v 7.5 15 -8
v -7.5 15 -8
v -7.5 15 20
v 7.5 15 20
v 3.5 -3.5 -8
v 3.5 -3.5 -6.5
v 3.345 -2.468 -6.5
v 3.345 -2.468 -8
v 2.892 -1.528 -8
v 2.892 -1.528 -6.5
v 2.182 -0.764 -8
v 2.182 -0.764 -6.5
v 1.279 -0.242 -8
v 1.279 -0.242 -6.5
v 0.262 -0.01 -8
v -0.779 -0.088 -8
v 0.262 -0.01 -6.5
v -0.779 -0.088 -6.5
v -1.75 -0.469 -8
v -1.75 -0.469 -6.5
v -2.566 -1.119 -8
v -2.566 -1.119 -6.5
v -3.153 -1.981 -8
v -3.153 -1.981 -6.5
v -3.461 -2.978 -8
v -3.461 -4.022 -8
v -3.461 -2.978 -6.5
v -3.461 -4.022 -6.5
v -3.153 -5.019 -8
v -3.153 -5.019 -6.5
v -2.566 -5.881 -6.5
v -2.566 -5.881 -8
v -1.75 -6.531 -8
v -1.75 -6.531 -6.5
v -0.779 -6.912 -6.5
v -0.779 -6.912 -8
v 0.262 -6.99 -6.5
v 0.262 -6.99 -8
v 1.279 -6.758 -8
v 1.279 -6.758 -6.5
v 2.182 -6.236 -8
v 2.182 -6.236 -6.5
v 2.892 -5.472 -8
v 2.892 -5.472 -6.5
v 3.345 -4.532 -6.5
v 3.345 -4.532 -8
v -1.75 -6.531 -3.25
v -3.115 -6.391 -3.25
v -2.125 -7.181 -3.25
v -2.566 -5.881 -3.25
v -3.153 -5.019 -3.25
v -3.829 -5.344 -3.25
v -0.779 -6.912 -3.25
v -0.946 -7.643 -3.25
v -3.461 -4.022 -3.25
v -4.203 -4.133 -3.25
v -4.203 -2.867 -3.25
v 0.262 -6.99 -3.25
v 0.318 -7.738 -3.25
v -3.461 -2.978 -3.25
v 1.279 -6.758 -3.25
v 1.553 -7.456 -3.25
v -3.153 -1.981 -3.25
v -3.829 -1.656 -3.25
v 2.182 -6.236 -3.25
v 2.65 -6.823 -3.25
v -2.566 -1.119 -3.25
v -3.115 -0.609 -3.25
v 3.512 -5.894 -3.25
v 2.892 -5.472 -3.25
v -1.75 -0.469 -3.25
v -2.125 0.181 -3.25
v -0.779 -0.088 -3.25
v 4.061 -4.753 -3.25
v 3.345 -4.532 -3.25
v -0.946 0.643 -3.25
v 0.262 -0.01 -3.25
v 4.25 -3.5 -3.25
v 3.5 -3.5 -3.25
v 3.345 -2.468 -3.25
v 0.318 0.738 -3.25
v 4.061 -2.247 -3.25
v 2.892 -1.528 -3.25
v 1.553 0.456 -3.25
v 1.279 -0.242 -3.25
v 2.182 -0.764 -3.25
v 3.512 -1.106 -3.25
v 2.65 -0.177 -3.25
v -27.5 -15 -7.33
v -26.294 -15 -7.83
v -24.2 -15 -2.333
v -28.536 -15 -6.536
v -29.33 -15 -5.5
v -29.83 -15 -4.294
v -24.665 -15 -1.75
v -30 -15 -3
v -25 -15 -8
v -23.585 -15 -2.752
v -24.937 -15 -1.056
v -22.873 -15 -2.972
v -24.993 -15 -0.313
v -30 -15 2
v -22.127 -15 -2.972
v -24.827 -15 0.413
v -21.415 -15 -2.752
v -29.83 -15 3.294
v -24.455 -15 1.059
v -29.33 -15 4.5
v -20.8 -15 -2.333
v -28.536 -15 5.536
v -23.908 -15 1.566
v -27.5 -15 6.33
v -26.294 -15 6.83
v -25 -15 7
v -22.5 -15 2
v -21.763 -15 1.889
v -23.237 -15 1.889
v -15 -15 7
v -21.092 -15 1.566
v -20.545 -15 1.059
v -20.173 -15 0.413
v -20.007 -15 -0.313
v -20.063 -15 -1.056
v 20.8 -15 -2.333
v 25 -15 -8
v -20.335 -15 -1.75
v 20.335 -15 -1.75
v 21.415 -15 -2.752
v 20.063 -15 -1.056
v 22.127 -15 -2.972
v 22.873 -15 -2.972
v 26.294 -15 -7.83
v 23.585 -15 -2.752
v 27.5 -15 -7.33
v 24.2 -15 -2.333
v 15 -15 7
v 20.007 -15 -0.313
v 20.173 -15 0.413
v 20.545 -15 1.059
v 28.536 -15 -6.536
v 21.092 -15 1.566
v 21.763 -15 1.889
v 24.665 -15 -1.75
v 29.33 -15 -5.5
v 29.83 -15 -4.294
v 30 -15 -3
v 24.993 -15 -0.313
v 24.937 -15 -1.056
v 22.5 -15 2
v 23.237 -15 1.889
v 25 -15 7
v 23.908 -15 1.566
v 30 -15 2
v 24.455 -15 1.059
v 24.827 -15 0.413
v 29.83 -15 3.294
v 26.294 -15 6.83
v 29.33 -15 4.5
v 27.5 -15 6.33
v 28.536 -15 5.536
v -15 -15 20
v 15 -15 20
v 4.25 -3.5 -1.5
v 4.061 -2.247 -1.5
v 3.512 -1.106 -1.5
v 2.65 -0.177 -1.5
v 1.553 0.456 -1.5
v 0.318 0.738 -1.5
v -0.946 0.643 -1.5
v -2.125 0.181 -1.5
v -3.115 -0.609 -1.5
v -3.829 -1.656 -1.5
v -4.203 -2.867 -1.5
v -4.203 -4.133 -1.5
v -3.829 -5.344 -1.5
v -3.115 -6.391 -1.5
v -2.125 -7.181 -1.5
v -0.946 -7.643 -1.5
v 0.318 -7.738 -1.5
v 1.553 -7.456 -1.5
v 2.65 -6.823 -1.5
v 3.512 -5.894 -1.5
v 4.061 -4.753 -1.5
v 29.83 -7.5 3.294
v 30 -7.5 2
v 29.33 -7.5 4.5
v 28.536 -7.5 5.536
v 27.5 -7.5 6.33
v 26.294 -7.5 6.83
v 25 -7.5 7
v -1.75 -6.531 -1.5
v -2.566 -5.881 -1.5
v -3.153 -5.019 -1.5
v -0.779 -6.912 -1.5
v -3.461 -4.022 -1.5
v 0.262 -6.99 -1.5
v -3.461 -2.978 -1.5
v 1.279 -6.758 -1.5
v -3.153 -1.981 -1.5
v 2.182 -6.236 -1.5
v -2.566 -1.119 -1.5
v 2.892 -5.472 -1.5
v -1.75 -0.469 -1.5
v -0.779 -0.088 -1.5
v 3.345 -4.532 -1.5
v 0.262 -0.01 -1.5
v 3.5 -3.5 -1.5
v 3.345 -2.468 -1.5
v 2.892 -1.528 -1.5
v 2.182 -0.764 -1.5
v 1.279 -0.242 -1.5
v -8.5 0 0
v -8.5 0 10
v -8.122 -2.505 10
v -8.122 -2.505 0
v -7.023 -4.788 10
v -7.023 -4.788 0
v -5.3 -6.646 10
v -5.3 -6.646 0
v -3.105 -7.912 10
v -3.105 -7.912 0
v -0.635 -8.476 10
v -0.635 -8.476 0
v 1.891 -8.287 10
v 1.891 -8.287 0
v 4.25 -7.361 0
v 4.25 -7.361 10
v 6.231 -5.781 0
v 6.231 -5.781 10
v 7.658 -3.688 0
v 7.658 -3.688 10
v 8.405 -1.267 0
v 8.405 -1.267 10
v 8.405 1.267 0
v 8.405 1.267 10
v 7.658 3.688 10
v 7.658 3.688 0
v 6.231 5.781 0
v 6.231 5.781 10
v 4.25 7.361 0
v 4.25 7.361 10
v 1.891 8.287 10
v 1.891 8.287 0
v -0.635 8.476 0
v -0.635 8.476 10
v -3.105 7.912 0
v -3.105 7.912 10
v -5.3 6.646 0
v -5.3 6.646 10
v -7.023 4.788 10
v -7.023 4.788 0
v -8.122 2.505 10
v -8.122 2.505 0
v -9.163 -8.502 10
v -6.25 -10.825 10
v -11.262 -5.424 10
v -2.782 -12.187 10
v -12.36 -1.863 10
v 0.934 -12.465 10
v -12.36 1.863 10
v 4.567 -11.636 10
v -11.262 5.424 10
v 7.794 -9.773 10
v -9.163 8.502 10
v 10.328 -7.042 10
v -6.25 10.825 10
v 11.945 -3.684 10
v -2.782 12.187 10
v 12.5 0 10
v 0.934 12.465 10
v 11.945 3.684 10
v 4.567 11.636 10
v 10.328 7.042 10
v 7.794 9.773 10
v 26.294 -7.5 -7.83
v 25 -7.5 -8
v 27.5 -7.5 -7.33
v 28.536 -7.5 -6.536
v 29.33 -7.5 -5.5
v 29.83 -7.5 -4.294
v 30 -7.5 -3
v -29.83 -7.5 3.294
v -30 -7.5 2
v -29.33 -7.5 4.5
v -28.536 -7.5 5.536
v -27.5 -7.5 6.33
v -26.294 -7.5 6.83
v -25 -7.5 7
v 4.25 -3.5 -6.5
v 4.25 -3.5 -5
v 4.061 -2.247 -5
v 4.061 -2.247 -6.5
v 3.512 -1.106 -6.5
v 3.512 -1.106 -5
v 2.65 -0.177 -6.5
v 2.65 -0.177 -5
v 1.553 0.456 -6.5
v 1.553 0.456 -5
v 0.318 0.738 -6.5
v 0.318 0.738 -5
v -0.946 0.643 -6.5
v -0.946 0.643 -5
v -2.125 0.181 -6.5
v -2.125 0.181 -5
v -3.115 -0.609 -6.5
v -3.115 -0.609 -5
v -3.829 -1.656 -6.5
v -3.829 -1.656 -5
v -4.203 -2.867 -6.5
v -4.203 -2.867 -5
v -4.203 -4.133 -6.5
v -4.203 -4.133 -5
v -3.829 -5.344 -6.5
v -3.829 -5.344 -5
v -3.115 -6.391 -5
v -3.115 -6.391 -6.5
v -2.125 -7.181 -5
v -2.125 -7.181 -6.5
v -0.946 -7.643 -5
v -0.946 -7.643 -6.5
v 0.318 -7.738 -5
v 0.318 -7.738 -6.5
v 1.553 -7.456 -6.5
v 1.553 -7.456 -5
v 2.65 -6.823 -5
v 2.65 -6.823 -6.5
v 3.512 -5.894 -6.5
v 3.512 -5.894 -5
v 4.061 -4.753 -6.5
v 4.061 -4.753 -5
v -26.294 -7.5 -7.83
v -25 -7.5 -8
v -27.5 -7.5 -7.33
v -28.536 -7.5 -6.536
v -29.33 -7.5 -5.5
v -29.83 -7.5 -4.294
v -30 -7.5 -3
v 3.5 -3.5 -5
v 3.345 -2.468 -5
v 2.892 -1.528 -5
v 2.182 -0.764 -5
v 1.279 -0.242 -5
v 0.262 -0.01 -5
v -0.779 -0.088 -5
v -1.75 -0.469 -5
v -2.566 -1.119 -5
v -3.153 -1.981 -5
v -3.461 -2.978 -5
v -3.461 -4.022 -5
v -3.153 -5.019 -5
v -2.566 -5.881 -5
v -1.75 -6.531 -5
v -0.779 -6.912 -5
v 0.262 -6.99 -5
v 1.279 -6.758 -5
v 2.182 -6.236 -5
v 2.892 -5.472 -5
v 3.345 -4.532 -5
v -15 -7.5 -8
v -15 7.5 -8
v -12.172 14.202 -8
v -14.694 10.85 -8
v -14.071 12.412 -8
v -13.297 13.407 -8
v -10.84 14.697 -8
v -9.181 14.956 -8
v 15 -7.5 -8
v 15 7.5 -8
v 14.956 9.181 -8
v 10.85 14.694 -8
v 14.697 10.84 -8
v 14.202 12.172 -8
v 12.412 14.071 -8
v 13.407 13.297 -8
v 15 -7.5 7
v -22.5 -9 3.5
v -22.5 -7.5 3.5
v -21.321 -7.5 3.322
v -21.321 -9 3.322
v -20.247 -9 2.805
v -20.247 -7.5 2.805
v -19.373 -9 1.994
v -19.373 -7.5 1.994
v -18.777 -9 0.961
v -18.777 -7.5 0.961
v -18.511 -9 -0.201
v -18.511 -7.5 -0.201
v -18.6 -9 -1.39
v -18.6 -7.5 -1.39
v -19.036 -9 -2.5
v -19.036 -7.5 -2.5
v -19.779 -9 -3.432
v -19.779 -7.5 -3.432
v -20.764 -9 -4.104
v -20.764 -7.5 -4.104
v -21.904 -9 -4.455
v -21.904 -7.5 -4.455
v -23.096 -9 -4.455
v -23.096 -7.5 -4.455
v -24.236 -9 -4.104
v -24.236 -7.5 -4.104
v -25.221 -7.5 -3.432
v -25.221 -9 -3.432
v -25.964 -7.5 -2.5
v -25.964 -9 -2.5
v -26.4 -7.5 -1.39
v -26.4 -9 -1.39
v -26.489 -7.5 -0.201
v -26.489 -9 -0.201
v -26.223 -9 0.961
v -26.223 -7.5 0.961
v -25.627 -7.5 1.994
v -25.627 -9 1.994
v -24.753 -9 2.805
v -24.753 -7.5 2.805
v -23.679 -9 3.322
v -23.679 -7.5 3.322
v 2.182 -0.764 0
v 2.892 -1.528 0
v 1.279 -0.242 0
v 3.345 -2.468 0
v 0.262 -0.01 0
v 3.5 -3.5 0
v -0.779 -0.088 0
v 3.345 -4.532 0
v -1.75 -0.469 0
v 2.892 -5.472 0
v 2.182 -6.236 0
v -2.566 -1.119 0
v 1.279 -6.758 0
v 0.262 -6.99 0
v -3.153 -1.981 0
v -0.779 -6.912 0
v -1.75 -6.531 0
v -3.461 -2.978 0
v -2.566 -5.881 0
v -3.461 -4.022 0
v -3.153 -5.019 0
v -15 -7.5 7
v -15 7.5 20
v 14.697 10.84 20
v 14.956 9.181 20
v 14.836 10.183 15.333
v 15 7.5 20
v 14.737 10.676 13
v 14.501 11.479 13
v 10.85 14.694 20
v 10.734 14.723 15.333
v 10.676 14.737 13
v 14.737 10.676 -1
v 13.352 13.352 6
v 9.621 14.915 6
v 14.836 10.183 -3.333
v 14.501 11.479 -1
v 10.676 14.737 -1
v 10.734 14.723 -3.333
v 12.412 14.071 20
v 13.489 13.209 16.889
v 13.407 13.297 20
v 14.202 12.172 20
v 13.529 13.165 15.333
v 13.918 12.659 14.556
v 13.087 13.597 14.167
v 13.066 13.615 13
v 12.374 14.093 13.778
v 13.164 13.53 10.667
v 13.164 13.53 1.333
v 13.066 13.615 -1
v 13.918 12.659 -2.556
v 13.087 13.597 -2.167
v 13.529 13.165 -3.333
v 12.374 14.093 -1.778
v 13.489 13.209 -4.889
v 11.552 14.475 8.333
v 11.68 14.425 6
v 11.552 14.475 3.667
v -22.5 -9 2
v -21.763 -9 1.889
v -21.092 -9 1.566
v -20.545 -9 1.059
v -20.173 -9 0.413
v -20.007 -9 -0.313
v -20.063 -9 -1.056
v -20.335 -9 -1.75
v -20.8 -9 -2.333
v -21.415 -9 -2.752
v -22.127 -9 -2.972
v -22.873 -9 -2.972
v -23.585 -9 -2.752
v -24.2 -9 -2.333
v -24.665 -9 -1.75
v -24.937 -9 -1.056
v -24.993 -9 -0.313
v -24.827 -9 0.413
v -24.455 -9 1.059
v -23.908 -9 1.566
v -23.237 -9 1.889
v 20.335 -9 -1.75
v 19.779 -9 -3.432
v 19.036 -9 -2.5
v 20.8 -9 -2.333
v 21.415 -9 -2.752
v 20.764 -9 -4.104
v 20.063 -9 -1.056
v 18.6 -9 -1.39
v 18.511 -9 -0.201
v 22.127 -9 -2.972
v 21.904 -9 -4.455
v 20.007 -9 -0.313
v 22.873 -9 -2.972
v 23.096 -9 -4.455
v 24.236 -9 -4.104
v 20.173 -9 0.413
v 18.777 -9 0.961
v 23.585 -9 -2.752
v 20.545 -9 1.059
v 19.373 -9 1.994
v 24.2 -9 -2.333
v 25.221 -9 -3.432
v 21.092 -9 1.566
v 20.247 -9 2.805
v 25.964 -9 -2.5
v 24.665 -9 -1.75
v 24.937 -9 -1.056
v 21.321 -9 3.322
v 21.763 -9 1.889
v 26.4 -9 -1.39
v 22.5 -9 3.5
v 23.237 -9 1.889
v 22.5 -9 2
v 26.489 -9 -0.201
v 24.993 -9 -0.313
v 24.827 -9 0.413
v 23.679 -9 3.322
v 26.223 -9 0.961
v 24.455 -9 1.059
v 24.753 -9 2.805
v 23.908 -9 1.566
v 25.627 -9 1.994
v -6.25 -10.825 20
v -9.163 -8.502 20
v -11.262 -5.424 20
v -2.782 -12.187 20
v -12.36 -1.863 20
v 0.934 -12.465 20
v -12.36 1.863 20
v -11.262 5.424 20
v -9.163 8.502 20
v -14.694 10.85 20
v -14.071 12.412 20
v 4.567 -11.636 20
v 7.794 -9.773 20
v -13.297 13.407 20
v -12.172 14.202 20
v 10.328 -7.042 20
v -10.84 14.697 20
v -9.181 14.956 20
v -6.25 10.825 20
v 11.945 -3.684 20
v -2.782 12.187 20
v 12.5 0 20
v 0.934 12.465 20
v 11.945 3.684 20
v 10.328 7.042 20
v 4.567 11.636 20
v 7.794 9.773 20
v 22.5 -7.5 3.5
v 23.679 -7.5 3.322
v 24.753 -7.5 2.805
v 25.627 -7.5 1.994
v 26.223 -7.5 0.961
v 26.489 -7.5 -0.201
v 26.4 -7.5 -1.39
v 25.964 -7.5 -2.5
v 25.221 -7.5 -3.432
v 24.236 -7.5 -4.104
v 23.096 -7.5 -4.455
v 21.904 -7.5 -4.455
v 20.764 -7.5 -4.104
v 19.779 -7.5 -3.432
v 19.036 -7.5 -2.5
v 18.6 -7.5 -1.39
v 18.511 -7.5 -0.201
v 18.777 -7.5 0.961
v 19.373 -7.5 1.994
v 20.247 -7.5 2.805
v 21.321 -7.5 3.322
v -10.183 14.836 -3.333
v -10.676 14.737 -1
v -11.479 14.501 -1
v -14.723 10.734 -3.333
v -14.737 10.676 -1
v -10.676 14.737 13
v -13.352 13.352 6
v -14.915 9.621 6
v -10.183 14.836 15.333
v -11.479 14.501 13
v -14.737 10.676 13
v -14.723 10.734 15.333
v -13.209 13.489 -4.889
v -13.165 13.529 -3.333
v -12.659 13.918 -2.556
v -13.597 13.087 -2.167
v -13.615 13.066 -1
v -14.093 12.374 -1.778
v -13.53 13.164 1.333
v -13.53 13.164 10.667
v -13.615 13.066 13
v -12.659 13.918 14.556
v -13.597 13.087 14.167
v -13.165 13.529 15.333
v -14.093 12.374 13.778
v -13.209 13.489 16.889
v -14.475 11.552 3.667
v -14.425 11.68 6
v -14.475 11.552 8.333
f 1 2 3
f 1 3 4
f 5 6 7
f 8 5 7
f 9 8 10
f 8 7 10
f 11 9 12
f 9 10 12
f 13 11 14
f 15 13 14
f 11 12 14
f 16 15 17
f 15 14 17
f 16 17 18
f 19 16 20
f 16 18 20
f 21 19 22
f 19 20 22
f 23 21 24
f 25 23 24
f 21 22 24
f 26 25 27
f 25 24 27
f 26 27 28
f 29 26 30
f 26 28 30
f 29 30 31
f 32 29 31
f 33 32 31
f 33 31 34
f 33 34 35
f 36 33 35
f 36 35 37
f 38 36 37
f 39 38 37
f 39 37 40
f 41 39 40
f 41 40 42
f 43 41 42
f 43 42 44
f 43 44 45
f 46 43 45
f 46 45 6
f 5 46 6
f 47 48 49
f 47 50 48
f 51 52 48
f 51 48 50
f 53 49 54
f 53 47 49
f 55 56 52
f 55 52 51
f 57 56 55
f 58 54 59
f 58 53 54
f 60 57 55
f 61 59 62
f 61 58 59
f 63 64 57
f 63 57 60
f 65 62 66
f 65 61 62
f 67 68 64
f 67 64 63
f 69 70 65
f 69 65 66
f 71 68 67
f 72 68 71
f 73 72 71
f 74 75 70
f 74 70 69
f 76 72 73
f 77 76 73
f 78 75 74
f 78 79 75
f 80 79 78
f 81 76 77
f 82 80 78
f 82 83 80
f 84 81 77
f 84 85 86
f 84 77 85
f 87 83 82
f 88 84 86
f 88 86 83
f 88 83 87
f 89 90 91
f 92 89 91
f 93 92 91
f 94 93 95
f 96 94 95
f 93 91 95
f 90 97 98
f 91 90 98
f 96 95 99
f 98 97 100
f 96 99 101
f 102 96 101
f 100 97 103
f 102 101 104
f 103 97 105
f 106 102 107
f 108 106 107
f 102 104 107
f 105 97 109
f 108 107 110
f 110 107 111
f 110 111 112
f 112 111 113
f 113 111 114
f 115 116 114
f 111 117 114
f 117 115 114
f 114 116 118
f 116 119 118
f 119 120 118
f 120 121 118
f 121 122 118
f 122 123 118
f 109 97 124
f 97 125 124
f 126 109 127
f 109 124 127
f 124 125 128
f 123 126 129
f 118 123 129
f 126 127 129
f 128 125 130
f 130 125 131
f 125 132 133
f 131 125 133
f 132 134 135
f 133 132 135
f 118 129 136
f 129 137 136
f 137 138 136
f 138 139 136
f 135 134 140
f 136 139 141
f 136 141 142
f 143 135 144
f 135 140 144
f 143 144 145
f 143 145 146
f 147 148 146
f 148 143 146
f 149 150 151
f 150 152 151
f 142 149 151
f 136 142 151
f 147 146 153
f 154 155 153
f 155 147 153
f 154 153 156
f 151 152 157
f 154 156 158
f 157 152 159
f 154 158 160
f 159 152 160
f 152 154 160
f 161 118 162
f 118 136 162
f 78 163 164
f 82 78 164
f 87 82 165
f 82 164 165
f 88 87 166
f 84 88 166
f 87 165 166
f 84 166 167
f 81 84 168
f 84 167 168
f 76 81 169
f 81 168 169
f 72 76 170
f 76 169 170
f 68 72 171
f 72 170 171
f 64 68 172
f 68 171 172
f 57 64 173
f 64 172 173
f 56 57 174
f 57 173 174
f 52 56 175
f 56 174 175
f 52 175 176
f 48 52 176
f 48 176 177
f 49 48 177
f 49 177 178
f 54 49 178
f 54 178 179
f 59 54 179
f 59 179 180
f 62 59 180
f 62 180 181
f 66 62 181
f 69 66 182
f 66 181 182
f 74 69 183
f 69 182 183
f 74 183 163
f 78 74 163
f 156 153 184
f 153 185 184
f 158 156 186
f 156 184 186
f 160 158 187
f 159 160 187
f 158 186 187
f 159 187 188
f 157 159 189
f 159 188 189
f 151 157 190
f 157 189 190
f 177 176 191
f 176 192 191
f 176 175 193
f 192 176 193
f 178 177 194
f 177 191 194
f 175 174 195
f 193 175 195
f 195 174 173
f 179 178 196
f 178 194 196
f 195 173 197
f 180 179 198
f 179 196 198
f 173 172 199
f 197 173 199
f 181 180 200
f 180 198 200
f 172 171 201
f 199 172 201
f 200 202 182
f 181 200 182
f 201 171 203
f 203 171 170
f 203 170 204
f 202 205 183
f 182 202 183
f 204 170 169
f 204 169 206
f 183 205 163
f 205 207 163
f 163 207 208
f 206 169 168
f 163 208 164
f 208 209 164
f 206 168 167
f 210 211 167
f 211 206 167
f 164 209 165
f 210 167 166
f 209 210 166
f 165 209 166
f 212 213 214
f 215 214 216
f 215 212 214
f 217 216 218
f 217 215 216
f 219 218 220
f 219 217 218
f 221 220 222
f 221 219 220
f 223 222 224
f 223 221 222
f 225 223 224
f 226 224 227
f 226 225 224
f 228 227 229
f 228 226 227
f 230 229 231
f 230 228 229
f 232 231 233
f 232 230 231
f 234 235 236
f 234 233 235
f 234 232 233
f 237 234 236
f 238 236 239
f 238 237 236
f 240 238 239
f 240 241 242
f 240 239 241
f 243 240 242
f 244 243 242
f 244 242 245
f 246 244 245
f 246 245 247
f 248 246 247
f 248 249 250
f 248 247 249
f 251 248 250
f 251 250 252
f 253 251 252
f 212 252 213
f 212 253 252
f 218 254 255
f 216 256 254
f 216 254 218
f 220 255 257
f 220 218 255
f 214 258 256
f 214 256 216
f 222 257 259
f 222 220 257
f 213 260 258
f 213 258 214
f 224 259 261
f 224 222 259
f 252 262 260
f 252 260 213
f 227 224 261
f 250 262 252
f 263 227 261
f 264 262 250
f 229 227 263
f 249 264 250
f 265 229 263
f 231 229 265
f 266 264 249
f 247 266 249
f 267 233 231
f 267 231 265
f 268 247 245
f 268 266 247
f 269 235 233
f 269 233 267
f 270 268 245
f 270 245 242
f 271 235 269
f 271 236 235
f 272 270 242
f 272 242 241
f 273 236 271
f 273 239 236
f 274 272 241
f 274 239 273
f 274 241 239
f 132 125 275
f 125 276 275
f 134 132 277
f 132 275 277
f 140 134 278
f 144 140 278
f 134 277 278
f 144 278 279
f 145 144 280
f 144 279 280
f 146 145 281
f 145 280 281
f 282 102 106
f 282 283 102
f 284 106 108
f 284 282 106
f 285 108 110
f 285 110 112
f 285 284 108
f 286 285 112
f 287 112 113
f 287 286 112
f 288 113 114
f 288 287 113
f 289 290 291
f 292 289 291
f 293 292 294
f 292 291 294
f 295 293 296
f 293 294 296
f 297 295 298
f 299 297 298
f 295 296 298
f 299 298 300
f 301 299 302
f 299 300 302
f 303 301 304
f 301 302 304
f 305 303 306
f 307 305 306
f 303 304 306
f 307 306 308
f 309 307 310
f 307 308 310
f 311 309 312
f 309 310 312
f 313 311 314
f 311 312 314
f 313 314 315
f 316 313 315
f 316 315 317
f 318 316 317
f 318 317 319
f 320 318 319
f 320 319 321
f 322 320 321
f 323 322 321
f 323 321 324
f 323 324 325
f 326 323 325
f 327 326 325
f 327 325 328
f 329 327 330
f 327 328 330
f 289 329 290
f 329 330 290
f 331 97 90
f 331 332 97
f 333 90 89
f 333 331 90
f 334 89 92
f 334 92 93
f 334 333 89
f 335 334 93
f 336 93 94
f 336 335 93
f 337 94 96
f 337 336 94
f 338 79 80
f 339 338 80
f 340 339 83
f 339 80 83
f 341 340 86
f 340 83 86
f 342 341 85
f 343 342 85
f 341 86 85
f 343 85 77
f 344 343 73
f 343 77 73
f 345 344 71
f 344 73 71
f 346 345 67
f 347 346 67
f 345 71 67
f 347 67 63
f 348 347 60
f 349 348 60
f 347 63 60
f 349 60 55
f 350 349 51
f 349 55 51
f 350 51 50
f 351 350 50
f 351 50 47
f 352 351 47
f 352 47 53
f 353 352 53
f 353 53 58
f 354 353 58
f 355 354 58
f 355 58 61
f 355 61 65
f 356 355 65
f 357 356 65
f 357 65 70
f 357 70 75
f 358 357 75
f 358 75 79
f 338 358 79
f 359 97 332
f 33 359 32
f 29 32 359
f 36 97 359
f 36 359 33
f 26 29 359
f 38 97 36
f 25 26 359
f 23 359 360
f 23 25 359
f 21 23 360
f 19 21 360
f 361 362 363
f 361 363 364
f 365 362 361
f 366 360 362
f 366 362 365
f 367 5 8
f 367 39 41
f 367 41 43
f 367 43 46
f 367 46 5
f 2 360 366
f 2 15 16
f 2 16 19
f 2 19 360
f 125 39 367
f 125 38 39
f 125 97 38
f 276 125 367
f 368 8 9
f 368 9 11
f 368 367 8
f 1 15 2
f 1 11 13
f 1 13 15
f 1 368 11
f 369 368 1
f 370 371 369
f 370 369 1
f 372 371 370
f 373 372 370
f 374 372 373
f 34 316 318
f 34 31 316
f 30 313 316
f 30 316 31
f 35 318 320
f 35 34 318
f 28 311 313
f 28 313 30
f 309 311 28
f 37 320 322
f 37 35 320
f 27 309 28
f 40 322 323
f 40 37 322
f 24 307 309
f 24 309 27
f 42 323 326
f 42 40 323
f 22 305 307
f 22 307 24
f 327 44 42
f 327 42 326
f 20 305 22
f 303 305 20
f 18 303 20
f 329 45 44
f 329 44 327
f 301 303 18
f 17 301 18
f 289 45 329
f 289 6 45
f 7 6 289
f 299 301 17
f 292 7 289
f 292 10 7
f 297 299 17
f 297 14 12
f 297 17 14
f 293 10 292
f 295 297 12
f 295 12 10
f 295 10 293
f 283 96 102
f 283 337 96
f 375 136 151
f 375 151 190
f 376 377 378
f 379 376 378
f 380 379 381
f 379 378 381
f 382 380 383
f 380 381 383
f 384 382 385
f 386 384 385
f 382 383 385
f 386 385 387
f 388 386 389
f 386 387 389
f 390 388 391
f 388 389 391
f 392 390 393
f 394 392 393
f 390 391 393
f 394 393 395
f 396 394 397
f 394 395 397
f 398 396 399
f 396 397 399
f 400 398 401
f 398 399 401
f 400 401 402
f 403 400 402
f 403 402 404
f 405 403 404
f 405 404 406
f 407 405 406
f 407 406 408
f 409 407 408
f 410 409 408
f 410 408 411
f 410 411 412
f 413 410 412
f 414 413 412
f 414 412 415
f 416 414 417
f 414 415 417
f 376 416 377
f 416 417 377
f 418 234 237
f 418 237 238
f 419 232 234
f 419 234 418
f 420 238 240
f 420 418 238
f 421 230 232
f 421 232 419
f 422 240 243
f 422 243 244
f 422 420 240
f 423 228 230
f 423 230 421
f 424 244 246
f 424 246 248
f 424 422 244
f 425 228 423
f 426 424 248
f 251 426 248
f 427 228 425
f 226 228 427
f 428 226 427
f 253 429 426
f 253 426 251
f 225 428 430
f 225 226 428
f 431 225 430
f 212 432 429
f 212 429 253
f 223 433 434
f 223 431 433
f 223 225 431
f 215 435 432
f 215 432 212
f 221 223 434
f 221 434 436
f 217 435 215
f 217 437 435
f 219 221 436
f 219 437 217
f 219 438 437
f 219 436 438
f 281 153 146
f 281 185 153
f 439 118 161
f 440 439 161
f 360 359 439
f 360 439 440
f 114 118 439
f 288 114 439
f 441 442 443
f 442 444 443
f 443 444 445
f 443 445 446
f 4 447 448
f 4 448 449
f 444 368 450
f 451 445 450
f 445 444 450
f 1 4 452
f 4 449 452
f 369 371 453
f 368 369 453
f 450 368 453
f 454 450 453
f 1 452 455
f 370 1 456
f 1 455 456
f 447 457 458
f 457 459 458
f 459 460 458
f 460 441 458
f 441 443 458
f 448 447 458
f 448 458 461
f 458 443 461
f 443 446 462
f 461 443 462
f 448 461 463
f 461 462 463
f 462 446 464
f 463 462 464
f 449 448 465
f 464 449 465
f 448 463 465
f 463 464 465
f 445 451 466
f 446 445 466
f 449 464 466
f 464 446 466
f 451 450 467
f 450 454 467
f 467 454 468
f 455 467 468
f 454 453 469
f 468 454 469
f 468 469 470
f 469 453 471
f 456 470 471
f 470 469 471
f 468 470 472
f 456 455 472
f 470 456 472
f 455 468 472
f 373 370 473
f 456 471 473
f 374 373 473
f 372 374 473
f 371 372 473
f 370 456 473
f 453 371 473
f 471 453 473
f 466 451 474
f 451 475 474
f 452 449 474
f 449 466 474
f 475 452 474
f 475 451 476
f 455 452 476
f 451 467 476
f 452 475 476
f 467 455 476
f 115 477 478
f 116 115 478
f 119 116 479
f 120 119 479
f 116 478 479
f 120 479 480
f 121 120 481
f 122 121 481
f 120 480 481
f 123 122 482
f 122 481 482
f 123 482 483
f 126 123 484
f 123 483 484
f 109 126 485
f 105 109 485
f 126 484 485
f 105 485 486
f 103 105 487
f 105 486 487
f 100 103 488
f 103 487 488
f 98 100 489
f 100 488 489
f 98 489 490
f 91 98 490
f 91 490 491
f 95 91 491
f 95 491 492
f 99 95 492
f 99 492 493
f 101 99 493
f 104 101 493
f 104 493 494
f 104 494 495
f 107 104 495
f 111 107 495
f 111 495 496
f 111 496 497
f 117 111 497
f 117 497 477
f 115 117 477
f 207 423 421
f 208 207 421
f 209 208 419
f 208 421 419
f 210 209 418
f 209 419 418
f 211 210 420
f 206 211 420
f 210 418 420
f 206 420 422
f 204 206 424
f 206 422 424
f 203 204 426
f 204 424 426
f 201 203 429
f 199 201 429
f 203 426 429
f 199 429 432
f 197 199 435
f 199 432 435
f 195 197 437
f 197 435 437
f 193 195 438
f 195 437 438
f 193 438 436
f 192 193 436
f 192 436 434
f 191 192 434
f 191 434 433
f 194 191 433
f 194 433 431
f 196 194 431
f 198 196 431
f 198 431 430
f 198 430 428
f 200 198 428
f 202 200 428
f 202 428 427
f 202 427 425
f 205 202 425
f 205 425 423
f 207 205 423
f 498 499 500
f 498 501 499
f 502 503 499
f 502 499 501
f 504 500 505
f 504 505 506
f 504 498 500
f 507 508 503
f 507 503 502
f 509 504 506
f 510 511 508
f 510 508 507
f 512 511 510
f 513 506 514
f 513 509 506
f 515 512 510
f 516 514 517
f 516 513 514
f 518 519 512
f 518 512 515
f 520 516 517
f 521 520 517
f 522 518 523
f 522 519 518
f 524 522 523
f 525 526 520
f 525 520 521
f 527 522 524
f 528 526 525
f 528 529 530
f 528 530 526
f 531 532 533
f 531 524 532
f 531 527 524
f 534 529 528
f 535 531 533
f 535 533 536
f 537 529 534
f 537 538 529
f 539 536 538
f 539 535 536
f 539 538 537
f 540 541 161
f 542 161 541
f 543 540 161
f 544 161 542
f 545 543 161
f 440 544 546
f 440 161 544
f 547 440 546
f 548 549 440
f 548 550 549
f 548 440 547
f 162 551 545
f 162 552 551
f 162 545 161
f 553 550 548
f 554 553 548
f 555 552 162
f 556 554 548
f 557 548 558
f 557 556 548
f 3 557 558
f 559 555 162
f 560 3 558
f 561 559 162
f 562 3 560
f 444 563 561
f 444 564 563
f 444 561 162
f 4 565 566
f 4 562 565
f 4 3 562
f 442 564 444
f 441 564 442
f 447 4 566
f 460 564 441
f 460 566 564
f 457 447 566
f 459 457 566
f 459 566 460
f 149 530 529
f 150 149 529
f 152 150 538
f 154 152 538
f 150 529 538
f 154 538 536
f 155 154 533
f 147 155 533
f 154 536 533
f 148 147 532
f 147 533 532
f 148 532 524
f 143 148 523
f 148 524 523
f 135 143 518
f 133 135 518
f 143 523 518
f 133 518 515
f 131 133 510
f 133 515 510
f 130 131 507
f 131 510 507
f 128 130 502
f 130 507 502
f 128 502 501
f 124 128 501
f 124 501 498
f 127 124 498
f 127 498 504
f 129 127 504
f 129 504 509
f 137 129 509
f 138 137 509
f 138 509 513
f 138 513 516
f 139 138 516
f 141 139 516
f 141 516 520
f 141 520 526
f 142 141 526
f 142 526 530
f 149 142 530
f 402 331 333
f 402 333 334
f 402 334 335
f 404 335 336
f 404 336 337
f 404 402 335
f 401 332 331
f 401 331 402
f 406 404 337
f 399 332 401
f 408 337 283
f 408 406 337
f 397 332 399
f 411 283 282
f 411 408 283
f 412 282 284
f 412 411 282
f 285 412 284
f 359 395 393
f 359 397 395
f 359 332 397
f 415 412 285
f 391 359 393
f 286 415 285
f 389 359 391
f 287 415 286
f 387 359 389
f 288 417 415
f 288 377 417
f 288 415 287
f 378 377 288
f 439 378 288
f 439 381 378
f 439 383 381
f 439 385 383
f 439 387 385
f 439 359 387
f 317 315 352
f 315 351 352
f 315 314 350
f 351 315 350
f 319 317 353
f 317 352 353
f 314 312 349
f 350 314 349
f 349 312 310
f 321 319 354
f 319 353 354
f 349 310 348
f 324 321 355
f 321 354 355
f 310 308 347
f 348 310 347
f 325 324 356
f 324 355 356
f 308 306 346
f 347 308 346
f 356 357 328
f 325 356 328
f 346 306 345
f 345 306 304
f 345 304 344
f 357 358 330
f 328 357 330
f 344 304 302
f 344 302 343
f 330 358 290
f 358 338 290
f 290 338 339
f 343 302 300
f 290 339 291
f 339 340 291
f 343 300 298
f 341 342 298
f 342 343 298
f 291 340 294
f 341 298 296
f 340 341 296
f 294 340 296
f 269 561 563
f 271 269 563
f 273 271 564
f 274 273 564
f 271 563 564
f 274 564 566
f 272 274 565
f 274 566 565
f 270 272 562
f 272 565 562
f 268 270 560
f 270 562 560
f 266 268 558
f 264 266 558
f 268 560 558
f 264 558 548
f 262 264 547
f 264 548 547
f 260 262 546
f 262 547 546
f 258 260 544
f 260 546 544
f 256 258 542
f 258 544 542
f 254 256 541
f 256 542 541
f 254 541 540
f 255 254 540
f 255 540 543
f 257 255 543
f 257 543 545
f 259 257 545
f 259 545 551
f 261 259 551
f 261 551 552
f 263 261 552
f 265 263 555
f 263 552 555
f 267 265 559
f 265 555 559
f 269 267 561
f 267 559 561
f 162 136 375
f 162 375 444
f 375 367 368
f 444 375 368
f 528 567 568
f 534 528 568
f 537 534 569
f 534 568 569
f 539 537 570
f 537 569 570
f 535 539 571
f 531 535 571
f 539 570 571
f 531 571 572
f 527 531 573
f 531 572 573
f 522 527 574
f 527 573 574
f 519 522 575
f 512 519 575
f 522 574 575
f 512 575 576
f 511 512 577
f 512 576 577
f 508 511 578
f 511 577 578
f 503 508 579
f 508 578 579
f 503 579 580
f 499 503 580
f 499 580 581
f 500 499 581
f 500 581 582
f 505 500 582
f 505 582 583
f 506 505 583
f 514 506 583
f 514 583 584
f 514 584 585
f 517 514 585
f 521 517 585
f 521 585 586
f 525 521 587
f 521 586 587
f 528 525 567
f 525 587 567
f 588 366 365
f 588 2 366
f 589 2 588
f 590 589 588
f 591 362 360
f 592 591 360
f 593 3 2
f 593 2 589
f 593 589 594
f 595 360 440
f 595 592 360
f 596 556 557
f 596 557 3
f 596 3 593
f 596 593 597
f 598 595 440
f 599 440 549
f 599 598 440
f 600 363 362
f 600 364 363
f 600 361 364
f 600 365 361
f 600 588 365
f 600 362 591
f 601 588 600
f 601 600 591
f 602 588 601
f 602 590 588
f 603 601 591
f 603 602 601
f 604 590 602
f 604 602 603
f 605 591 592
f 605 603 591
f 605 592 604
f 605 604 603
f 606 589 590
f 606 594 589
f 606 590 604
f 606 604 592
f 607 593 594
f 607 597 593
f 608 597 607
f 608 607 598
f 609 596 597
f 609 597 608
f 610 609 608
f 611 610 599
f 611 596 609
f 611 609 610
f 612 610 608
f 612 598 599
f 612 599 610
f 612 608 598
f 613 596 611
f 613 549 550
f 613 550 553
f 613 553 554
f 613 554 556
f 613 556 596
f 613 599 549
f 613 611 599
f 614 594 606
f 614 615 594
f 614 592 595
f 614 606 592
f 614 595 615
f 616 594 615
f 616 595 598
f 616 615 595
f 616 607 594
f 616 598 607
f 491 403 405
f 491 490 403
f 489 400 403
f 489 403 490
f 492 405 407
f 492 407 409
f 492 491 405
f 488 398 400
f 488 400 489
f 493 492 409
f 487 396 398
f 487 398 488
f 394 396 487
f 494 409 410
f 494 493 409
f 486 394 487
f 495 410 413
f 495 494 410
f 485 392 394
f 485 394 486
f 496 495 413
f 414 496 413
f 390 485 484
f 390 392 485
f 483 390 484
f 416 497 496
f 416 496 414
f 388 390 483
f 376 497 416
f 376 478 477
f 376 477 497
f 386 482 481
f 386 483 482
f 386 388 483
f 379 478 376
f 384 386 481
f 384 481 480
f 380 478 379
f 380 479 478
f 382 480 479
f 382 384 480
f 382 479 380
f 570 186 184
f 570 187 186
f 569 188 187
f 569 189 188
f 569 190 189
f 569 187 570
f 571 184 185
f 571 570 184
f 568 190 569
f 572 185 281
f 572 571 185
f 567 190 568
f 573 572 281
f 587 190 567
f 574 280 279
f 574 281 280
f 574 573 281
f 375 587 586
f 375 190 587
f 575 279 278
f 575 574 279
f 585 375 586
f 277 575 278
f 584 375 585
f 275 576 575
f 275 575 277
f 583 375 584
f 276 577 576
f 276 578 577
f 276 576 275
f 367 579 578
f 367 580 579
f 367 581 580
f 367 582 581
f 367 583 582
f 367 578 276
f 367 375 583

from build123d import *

# Parameters (mm, degrees)
BOSS_EXTRUDE1_DEPTH      = 20
BOSS_EXTRUDE1_DEPTH_BACK = 8
SKETCH1_W                = 30
SKETCH1_H                = 30
FILLET1_SIZE             = 7.5
SKETCH2_R                = 8.5
CUT_EXTRUDE1_DEPTH       = 60
SKETCH3_W                = 15
SKETCH3_H                = 7.5
BOSS_EXTRUDE2_DEPTH      = 15
SKETCH5_W                = 15
SKETCH5_H                = 7.5
BOSS_EXTRUDE4_DEPTH      = 15
SKETCH11_R               = 12.5
CUT_EXTRUDE3_DEPTH       = 10
SKETCH12_R               = 3.5
CUT_EXTRUDE4_DEPTH       = 10
FILLET8_R                = 5
SKETCH15_R               = 4
CUT_EXTRUDE5_DEPTH       = 1.5
SKETCH16_R               = 2.5
CUT_EXTRUDE6_DEPTH       = 12
CUT_EXTRUDE8_START       = -1.5
SKETCH18_R               = 4.25
CUT_EXTRUDE8_DEPTH       = 1.75
CUT_EXTRUDE9_START       = -5
SKETCH18_2_R             = 4.25
CUT_EXTRUDE9_DEPTH       = 1.5


with BuildPart() as part:
    # Sketch1 → Boss-Extrude1 (new, two sides: drawn at the far end of the back side and taken through both)
    with BuildSketch(Plane.XY.offset(-BOSS_EXTRUDE1_DEPTH_BACK)):
        Rectangle(SKETCH1_W, SKETCH1_H)
    extrude(amount=BOSS_EXTRUDE1_DEPTH + BOSS_EXTRUDE1_DEPTH_BACK)

    # Fillet1
    # a fillet whose section is not a circle: 7.5 mm, written as the material it takes off along each edge
    with BuildSketch(Plane(origin=(-15, 15, 38.75), x_dir=(1, 0, 0), z_dir=(0, 0, -1))) as fillet1_piece_1:
        with BuildLine():
            add(Edge.make_bspline([(FILLET1_SIZE, 0), (FILLET1_SIZE * 0.831801948466, 0), (FILLET1_SIZE * 0.663603896932, 0), (FILLET1_SIZE * 0.292893218813, FILLET1_SIZE * 0.0716919198361), (FILLET1_SIZE * 0.0716919198361, FILLET1_SIZE * 0.292893218813), (0, FILLET1_SIZE * 0.663603896932), (0, FILLET1_SIZE * 0.831801948466), (0, FILLET1_SIZE)], knots=[0, 0, 0, 0, 0, 0, 0.5, 0.5, 1, 1, 1, 1, 1, 1], degree=5))
            Line((0, FILLET1_SIZE), (0, 0))
            Line((0, 0), (FILLET1_SIZE, 0))
        make_face()
    extrude(amount=65.5, mode=Mode.SUBTRACT)
    with BuildSketch(Plane(origin=(15, 15, -26.75), x_dir=(0, -1, 0), z_dir=(0, 0, 1))) as fillet1_piece_2:
        with BuildLine():
            add(Edge.make_bspline([(FILLET1_SIZE, 0), (FILLET1_SIZE * 0.831801948466, 0), (FILLET1_SIZE * 0.663603896932, 0), (FILLET1_SIZE * 0.292893218813, -FILLET1_SIZE * 0.0716919198361), (FILLET1_SIZE * 0.0716919198361, -FILLET1_SIZE * 0.292893218813), (0, -FILLET1_SIZE * 0.663603896932), (0, -FILLET1_SIZE * 0.831801948466), (0, -FILLET1_SIZE)], knots=[0, 0, 0, 0, 0, 0, 0.5, 0.5, 1, 1, 1, 1, 1, 1], degree=5))
            Line((0, -FILLET1_SIZE), (0, 0))
            Line((0, 0), (FILLET1_SIZE, 0))
        make_face()
    extrude(amount=65.5, mode=Mode.SUBTRACT)

    # Sketch2 → Cut-Extrude1 (cut)
    with BuildSketch(Plane.XY):
        with Locations(Location((0, 0, 0), (0, 0, 180))):
            Circle(SKETCH2_R)
    extrude(amount=CUT_EXTRUDE1_DEPTH, mode=Mode.SUBTRACT)

    # Sketch3 → Boss-Extrude2 (add)
    with BuildSketch(Plane(origin=(15, 0, 0), x_dir=(0, 0, -1), z_dir=(1, 0, 0))):
        with Locations((0.5, -11.25)):
            Rectangle(SKETCH3_W, SKETCH3_H)
    extrude(amount=BOSS_EXTRUDE2_DEPTH)

    # Sketch5 → Boss-Extrude4 (add)
    with BuildSketch(Plane.ZY.offset(15)):
        with Locations((-0.5, -11.25)):
            Rectangle(SKETCH5_W, SKETCH5_H)
    extrude(amount=BOSS_EXTRUDE4_DEPTH)

    # Sketch11 → Cut-Extrude3 (cut)
    with BuildSketch(Plane.XY.offset(20)):
        Circle(SKETCH11_R)
    extrude(amount=-CUT_EXTRUDE3_DEPTH, mode=Mode.SUBTRACT)

    # Sketch12 → Cut-Extrude4 (cut)
    with BuildSketch(Plane.XY):
        with Locations((0, -3.5)):
            Circle(SKETCH12_R)
    extrude(amount=-CUT_EXTRUDE4_DEPTH, mode=Mode.SUBTRACT)

    # Fillet8
    fillet8_edges = [part.edges().sort_by_distance(p)[0] for p in [
        (30, -11.25, -8),
        (30, -11.25, 7),
        (-30, -11.25, -8),
        (-30, -11.25, 7),
    ]]
    fillet(fillet8_edges, radius=FILLET8_R)

    # Sketch15 → Cut-Extrude5 (cut)
    with BuildSketch(Plane(origin=(0, -7.5, 0), x_dir=(1, 0, 0), z_dir=(0, 1, 0))):
        with Locations(Location((22.5, 0.5, 0), (0, 0, 270))):
            Circle(SKETCH15_R)
        with Locations(Location((-22.5, 0.5, 0), (0, 0, 270))):
            Circle(SKETCH15_R)
    extrude(amount=-CUT_EXTRUDE5_DEPTH, mode=Mode.SUBTRACT)

    # Sketch16 → Cut-Extrude6 (cut)
    with BuildSketch(Plane(origin=(0, -9, 0), x_dir=(1, 0, 0), z_dir=(0, 1, 0))):
        with Locations(Location((-22.5, 0.5, 0), (0, 0, 270))):
            Circle(SKETCH16_R)
        with Locations(Location((22.5, 0.5, 0), (0, 0, 270))):
            Circle(SKETCH16_R)
    extrude(amount=-CUT_EXTRUDE6_DEPTH, mode=Mode.SUBTRACT)

    # Sketch18 → Cut-Extrude8 (cut)
    with BuildSketch(Plane.XY.offset(CUT_EXTRUDE8_START)):
        with Locations((0, -3.5)):
            Circle(SKETCH18_R)
    extrude(amount=-CUT_EXTRUDE8_DEPTH, mode=Mode.SUBTRACT)

    # Sketch18<2> → Cut-Extrude9 (cut)
    with BuildSketch(Plane.XY.offset(CUT_EXTRUDE9_START)):
        with Locations((0, -3.5)):
            Circle(SKETCH18_2_R)
    extrude(amount=-CUT_EXTRUDE9_DEPTH, mode=Mode.SUBTRACT)


solid = part.part
